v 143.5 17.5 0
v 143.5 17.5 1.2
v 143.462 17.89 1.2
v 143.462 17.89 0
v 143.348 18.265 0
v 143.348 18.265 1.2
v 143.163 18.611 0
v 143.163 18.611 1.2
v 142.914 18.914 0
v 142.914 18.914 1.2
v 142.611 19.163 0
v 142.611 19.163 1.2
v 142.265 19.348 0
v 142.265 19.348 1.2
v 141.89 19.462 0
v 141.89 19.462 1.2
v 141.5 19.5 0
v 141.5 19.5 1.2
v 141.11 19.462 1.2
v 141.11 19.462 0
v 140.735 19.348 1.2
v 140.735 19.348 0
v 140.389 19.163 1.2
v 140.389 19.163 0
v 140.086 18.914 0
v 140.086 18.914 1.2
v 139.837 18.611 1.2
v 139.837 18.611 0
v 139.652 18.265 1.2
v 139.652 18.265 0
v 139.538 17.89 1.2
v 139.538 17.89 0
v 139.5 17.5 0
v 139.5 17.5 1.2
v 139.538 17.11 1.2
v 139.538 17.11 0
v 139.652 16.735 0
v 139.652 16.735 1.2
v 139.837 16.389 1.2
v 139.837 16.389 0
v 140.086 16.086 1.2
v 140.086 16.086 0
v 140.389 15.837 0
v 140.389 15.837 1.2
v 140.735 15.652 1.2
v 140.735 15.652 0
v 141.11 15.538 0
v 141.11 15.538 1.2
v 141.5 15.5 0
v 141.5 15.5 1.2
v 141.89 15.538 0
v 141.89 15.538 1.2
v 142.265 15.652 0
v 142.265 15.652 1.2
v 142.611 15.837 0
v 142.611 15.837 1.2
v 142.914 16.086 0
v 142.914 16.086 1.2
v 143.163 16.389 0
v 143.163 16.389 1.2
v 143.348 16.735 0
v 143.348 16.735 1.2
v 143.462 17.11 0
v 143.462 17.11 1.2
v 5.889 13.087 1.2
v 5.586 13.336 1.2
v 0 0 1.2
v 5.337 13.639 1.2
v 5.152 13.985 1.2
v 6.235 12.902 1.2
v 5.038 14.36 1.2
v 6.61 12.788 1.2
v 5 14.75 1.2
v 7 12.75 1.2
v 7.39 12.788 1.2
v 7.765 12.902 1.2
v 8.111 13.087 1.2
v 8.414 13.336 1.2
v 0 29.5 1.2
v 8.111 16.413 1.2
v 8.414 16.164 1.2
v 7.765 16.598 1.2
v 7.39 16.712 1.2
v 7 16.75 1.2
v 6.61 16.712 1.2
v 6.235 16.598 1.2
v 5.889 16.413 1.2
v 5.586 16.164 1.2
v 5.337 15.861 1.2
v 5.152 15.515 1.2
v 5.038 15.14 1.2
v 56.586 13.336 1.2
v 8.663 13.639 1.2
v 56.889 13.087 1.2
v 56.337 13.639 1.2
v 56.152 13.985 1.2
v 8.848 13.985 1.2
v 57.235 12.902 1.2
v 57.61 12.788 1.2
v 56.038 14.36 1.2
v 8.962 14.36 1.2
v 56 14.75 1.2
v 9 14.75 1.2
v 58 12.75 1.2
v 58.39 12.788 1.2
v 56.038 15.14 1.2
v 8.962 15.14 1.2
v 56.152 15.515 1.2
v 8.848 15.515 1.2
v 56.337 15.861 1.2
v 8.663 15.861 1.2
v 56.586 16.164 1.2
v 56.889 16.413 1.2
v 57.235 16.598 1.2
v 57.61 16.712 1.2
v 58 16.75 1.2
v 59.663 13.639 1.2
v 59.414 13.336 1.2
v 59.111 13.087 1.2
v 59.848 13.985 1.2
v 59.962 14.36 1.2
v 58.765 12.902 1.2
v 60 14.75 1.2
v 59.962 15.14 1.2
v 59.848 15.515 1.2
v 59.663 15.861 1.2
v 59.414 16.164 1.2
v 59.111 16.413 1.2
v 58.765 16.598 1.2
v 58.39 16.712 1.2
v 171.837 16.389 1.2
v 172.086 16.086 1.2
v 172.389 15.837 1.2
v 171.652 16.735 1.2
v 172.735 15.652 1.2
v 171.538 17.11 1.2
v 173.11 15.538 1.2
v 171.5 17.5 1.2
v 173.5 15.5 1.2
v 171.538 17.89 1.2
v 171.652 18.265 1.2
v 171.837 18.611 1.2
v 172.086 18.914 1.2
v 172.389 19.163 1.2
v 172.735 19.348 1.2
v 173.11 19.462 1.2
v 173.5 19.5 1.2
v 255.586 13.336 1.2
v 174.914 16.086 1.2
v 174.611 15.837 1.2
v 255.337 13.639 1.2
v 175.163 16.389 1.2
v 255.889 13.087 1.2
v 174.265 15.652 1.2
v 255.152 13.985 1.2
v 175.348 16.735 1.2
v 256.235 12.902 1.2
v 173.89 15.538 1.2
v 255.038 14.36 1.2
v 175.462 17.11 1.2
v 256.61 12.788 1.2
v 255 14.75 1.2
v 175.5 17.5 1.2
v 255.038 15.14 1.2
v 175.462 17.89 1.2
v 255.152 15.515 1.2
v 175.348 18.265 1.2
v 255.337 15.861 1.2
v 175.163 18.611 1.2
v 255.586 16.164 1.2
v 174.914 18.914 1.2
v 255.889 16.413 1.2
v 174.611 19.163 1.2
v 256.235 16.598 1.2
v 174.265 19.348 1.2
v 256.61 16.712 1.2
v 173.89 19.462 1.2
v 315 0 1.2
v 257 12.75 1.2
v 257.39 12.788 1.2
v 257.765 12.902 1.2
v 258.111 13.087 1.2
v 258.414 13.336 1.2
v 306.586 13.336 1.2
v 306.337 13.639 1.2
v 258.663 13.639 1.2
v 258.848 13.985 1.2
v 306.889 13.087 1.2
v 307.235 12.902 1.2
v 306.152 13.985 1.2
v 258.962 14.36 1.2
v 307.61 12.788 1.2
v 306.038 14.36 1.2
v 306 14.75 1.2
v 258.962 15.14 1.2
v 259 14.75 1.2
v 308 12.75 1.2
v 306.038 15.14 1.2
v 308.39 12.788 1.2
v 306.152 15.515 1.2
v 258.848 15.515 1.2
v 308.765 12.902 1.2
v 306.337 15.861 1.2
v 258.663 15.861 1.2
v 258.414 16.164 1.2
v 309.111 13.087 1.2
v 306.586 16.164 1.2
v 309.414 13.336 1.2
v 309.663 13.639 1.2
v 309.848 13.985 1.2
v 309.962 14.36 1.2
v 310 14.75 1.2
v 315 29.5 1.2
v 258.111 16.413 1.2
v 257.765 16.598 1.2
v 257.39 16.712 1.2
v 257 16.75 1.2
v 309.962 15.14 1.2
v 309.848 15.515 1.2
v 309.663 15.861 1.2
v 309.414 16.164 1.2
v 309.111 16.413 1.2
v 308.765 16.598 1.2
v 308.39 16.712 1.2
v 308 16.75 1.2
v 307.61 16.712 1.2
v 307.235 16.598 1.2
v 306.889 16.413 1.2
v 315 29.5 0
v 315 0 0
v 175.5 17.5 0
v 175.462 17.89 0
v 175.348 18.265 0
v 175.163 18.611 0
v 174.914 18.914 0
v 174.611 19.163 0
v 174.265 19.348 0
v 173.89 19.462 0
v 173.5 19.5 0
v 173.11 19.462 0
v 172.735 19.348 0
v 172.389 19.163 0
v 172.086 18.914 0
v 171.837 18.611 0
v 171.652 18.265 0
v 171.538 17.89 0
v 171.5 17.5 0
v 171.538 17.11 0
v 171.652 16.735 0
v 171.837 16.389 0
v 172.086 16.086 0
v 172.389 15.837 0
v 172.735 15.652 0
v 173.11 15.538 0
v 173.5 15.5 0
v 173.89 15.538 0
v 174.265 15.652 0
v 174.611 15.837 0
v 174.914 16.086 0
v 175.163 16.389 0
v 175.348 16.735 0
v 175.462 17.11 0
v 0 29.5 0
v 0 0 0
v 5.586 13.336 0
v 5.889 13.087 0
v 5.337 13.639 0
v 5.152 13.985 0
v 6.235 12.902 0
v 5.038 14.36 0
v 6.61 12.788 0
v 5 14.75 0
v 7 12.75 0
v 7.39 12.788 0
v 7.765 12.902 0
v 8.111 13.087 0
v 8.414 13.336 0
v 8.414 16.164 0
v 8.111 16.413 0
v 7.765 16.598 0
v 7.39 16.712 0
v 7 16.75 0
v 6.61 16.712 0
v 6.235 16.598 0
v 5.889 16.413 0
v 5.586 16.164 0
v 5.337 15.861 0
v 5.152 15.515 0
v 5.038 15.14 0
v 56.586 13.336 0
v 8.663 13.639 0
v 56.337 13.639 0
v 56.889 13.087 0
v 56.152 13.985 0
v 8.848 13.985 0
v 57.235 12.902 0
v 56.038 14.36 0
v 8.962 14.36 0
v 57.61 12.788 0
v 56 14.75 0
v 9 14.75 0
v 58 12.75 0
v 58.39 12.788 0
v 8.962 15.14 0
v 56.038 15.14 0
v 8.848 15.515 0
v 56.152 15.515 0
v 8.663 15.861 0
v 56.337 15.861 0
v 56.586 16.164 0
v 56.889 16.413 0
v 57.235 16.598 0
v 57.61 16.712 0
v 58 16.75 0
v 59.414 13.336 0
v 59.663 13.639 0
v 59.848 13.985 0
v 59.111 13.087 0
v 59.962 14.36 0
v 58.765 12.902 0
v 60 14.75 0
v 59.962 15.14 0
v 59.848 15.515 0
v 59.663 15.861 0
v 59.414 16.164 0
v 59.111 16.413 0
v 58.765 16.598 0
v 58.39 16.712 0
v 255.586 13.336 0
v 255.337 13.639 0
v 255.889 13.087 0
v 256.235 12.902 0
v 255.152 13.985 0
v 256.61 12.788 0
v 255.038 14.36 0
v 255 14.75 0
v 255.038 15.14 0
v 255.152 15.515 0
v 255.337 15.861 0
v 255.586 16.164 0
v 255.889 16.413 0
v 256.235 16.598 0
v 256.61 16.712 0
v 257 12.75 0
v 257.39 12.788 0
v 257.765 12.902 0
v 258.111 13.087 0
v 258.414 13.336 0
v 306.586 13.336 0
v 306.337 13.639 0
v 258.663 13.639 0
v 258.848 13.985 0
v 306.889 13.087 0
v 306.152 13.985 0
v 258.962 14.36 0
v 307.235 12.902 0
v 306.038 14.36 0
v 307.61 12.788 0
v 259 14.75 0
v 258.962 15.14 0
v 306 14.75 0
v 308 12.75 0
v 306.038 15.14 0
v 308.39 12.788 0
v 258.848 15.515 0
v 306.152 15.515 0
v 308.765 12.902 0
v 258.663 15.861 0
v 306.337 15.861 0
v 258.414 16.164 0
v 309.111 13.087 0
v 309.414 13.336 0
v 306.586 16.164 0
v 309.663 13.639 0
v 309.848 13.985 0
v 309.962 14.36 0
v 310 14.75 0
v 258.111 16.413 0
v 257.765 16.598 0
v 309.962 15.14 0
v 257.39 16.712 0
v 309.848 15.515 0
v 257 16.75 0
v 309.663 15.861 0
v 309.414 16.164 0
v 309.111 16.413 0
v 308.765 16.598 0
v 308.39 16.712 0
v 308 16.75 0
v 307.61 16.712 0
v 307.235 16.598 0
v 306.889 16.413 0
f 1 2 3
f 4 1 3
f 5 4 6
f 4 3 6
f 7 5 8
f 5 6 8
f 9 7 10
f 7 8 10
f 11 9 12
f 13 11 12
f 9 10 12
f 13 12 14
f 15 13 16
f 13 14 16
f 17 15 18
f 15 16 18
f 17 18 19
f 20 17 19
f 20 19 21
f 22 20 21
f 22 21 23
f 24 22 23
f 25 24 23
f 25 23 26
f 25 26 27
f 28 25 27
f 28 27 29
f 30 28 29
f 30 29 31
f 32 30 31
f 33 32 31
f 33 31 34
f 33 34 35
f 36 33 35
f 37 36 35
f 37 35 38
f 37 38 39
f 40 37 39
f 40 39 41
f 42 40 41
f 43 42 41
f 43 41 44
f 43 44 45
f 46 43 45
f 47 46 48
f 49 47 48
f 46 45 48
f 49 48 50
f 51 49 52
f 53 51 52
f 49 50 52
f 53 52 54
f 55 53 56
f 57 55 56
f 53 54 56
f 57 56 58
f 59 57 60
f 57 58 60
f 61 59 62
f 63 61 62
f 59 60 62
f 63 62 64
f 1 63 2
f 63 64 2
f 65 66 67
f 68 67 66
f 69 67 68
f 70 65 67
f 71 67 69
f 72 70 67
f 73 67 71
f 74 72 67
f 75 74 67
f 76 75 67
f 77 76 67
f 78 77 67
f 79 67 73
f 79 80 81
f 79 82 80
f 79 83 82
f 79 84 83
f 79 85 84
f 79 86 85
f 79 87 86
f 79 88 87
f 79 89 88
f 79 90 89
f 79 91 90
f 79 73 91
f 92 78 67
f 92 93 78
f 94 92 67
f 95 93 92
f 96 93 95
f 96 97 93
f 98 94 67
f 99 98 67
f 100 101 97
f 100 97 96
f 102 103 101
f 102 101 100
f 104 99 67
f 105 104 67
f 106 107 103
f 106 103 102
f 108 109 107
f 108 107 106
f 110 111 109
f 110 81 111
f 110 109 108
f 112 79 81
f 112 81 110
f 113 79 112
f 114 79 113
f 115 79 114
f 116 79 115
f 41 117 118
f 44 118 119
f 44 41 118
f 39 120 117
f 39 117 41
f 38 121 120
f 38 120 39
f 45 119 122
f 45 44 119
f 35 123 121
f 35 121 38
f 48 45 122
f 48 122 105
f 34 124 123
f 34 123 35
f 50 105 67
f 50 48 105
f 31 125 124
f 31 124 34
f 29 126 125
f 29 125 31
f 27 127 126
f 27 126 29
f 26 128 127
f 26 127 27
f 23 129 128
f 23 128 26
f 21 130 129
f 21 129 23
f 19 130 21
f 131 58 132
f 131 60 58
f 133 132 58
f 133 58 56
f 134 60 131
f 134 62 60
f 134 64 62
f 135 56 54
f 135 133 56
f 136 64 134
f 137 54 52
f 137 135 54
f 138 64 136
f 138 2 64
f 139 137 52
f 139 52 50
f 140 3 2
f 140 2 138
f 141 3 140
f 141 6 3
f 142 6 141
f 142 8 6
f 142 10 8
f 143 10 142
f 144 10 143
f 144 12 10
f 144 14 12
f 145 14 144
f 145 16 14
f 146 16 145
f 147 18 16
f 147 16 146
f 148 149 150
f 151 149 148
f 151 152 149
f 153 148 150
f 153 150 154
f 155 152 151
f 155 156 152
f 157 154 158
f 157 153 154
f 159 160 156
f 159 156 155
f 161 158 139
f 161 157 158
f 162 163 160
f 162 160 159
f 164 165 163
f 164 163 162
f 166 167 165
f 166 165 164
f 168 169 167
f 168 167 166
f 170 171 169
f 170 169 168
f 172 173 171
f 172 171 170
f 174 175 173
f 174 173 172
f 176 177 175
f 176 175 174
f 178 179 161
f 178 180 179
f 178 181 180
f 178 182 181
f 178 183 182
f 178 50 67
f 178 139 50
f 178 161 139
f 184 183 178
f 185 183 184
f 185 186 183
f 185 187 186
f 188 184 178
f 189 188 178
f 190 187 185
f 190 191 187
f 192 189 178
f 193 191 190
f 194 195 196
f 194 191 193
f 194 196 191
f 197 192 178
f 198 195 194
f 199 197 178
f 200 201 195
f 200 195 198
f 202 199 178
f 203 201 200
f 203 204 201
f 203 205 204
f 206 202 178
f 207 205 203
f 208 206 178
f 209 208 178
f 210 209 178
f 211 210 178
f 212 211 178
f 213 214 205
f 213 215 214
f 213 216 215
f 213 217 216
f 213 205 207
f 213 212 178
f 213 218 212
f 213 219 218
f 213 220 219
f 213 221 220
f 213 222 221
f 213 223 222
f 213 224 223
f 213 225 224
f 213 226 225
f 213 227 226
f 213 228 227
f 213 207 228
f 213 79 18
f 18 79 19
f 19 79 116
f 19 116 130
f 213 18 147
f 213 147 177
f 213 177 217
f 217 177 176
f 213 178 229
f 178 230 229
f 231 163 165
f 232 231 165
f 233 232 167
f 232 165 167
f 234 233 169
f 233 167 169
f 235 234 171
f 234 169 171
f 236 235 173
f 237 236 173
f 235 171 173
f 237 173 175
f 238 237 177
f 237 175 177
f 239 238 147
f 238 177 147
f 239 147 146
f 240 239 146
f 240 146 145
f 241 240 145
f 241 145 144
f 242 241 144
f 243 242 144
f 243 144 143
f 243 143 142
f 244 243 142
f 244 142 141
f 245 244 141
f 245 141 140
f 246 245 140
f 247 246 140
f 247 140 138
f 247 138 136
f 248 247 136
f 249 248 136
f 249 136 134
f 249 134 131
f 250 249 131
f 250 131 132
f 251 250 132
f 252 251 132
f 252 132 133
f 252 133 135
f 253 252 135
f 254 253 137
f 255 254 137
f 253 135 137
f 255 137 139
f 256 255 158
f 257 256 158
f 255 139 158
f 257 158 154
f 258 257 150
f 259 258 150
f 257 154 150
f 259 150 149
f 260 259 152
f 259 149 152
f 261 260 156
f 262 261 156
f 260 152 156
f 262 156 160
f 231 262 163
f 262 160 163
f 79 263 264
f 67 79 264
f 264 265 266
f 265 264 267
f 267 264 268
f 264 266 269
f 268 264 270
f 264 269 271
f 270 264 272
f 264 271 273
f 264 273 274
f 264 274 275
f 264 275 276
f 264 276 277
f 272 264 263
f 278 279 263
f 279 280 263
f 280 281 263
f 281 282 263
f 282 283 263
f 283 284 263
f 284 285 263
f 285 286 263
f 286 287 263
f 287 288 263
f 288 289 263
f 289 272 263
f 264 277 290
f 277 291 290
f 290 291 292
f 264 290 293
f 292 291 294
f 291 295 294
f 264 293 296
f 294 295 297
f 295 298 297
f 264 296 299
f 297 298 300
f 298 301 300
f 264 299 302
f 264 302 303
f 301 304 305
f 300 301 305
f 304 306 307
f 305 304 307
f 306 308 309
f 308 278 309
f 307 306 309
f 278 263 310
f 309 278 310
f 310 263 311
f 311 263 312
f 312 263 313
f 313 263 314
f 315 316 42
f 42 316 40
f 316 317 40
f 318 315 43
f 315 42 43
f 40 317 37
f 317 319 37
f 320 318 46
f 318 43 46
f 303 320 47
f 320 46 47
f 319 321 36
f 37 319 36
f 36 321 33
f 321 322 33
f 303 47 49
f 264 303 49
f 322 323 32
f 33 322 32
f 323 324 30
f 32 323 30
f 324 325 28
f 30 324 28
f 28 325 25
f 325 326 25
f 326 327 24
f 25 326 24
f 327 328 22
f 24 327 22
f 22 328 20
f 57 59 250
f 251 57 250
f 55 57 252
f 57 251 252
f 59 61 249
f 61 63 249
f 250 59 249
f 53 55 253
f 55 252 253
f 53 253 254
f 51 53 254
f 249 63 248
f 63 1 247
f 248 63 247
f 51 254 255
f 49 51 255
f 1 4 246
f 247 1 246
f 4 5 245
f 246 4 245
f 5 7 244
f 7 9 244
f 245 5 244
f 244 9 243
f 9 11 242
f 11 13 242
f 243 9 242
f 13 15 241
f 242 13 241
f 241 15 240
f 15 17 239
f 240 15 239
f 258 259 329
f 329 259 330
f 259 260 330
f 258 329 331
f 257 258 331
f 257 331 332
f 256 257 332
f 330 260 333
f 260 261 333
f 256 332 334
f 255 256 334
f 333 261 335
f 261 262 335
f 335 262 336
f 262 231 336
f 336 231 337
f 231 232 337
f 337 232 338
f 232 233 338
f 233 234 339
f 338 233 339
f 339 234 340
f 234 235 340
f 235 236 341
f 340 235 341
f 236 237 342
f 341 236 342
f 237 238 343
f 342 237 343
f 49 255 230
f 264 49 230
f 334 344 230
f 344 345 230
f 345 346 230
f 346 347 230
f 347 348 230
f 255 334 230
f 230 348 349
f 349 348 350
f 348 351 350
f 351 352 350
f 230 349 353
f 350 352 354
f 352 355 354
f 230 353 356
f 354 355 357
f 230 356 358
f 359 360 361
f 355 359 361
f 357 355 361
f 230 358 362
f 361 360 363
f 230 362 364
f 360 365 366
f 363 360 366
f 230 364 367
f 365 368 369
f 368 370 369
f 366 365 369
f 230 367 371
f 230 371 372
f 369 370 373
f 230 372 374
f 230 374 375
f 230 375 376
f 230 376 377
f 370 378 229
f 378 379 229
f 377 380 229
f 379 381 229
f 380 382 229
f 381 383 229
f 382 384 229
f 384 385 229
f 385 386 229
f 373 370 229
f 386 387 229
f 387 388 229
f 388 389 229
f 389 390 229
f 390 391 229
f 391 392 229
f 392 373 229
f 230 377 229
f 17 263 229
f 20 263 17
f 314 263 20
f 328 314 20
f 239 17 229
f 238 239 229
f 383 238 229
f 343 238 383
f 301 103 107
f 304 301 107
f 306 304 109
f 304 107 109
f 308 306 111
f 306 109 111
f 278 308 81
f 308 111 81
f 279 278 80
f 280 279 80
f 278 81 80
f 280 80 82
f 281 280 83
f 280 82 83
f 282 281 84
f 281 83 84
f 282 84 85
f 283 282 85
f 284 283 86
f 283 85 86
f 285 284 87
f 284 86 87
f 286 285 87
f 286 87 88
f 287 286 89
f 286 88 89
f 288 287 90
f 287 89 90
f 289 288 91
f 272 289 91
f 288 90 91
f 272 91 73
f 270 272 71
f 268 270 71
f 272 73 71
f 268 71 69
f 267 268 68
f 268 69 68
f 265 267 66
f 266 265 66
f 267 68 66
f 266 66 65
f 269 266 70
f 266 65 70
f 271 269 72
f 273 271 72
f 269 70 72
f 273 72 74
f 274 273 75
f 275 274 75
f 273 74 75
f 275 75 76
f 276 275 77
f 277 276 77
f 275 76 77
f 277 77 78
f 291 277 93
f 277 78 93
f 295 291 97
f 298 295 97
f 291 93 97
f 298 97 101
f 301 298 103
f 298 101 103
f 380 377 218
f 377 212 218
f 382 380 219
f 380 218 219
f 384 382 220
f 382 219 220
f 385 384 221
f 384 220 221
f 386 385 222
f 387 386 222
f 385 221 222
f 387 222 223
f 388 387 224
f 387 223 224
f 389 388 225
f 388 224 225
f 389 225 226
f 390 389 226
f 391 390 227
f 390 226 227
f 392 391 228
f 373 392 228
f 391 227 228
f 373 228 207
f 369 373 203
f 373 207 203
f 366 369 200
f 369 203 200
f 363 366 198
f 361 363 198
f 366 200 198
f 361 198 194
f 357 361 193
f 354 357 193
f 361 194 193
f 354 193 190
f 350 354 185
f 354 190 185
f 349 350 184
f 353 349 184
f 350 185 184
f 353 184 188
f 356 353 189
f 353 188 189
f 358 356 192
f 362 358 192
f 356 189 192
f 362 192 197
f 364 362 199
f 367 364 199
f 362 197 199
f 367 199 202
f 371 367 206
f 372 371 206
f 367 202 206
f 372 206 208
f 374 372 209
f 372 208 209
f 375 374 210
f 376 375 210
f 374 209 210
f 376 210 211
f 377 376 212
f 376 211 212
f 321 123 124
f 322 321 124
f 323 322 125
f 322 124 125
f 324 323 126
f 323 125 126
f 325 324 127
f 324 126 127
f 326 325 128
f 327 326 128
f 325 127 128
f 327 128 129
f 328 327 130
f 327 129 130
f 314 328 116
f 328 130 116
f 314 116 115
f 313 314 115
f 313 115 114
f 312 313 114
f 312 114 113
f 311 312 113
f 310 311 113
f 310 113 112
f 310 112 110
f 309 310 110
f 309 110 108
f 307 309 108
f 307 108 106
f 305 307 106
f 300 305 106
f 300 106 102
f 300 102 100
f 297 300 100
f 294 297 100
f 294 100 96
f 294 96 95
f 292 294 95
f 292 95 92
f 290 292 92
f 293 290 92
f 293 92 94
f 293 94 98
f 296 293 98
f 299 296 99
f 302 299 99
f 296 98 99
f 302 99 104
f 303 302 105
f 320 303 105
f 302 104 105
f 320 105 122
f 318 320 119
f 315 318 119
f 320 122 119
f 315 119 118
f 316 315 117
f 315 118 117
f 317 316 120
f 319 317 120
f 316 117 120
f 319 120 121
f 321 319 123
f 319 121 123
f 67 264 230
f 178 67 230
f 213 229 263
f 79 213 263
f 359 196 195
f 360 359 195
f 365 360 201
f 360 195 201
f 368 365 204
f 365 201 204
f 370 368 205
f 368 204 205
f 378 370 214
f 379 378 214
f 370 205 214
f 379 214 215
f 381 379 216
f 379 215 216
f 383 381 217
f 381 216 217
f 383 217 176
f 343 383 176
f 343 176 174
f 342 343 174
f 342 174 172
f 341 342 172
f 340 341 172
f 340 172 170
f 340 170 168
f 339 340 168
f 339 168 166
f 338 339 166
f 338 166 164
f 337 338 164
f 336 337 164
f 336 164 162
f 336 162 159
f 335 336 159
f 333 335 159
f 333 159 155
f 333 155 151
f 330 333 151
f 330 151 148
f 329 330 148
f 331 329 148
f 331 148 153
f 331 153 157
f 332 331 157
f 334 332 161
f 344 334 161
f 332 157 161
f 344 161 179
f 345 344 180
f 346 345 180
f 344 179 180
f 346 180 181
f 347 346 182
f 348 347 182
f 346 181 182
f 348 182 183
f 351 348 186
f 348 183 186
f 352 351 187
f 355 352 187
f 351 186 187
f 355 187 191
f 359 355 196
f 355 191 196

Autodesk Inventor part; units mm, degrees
ref_plane "YZ Plane" through (0, 0, 0) normal (1, 0, 0) x (0, 1, 0)
ref_plane "XZ Plane" through (0, 0, 0) normal (0, 1, 0) x (-1, 0, 0)
ref_plane "XY Plane" through (0, 0, 0) normal (0, 0, 1) x (1, 0, 0)
sketch "Эскиз1" plane through (0, 0, 0) normal (0, 0, 1) x (1, 0, 0)
  line L0 (0, 0) -> (315, 0)
  line L1 (315, 0) -> (315, 29.5)
  line L2 (315, 29.5) -> (0, 29.5)
  line L3 (0, 29.5) -> (0, 0)
  dimension "d0" = 315
  dimension "d1" = 29.5
extrude "Выдавливание1" add sketch "Эскиз1" along normal blind 1.2
sketch "Эскиз2" plane through (0, 0, 1.2) normal (0, 0, 1) x (1, 0, 0)
  circle A0 centre (58, 14.75) radius 2
  circle A1 centre (7, 14.75) radius 2
  point P0 (0, 0)
extrude "Выдавливание2" cut sketch "Эскиз2" against normal blind 10
sketch "Эскиз4" plane through (0, 0, 1.2) normal (0, 0, 1) x (1, 0, 0)
  line L0 (315, 29.5) -> (0, 29.5) construction
  line L1 (157.5, 29.5) -> (157.5, 0) construction
  line L2 (0, 0) -> (315, 0) construction
  line L3 (157.5, 1.5) -> (173.5, 17.5) construction
  line L4 (173.5, 17.5) -> (157.5, 33.5) construction
  line L5 (157.5, 33.5) -> (141.5, 17.5) construction
  line L6 (141.5, 17.5) -> (157.5, 1.5) construction
  line L7 (157.5, 1.5) -> (157.5, 33.5) construction
  line L8 (173.5, 17.5) -> (141.5, 17.5) construction
  circle A0 centre (173.5, 17.5) radius 2
  circle A1 centre (141.5, 17.5) radius 2
  point P0 (157.5, 17.5)
  dimension "d11" = 4
  dimension "d12" = 4
  dimension "d15" = 32
  dimension "d16" = 12
extrude "Выдавливание4" cut sketch "Эскиз4" against normal blind 10
sketch "Эскиз5" plane through (0, 0, 1.2) normal (0, 0, 1) x (1, 0, 0)
  circle A0 centre (308, 14.75) radius 2
  circle A1 centre (257, 14.75) radius 2
  point P0 (0, 0)
extrude "Выдавливание5" cut sketch "Эскиз5" against normal blind 10
properties part number "Линейка"
